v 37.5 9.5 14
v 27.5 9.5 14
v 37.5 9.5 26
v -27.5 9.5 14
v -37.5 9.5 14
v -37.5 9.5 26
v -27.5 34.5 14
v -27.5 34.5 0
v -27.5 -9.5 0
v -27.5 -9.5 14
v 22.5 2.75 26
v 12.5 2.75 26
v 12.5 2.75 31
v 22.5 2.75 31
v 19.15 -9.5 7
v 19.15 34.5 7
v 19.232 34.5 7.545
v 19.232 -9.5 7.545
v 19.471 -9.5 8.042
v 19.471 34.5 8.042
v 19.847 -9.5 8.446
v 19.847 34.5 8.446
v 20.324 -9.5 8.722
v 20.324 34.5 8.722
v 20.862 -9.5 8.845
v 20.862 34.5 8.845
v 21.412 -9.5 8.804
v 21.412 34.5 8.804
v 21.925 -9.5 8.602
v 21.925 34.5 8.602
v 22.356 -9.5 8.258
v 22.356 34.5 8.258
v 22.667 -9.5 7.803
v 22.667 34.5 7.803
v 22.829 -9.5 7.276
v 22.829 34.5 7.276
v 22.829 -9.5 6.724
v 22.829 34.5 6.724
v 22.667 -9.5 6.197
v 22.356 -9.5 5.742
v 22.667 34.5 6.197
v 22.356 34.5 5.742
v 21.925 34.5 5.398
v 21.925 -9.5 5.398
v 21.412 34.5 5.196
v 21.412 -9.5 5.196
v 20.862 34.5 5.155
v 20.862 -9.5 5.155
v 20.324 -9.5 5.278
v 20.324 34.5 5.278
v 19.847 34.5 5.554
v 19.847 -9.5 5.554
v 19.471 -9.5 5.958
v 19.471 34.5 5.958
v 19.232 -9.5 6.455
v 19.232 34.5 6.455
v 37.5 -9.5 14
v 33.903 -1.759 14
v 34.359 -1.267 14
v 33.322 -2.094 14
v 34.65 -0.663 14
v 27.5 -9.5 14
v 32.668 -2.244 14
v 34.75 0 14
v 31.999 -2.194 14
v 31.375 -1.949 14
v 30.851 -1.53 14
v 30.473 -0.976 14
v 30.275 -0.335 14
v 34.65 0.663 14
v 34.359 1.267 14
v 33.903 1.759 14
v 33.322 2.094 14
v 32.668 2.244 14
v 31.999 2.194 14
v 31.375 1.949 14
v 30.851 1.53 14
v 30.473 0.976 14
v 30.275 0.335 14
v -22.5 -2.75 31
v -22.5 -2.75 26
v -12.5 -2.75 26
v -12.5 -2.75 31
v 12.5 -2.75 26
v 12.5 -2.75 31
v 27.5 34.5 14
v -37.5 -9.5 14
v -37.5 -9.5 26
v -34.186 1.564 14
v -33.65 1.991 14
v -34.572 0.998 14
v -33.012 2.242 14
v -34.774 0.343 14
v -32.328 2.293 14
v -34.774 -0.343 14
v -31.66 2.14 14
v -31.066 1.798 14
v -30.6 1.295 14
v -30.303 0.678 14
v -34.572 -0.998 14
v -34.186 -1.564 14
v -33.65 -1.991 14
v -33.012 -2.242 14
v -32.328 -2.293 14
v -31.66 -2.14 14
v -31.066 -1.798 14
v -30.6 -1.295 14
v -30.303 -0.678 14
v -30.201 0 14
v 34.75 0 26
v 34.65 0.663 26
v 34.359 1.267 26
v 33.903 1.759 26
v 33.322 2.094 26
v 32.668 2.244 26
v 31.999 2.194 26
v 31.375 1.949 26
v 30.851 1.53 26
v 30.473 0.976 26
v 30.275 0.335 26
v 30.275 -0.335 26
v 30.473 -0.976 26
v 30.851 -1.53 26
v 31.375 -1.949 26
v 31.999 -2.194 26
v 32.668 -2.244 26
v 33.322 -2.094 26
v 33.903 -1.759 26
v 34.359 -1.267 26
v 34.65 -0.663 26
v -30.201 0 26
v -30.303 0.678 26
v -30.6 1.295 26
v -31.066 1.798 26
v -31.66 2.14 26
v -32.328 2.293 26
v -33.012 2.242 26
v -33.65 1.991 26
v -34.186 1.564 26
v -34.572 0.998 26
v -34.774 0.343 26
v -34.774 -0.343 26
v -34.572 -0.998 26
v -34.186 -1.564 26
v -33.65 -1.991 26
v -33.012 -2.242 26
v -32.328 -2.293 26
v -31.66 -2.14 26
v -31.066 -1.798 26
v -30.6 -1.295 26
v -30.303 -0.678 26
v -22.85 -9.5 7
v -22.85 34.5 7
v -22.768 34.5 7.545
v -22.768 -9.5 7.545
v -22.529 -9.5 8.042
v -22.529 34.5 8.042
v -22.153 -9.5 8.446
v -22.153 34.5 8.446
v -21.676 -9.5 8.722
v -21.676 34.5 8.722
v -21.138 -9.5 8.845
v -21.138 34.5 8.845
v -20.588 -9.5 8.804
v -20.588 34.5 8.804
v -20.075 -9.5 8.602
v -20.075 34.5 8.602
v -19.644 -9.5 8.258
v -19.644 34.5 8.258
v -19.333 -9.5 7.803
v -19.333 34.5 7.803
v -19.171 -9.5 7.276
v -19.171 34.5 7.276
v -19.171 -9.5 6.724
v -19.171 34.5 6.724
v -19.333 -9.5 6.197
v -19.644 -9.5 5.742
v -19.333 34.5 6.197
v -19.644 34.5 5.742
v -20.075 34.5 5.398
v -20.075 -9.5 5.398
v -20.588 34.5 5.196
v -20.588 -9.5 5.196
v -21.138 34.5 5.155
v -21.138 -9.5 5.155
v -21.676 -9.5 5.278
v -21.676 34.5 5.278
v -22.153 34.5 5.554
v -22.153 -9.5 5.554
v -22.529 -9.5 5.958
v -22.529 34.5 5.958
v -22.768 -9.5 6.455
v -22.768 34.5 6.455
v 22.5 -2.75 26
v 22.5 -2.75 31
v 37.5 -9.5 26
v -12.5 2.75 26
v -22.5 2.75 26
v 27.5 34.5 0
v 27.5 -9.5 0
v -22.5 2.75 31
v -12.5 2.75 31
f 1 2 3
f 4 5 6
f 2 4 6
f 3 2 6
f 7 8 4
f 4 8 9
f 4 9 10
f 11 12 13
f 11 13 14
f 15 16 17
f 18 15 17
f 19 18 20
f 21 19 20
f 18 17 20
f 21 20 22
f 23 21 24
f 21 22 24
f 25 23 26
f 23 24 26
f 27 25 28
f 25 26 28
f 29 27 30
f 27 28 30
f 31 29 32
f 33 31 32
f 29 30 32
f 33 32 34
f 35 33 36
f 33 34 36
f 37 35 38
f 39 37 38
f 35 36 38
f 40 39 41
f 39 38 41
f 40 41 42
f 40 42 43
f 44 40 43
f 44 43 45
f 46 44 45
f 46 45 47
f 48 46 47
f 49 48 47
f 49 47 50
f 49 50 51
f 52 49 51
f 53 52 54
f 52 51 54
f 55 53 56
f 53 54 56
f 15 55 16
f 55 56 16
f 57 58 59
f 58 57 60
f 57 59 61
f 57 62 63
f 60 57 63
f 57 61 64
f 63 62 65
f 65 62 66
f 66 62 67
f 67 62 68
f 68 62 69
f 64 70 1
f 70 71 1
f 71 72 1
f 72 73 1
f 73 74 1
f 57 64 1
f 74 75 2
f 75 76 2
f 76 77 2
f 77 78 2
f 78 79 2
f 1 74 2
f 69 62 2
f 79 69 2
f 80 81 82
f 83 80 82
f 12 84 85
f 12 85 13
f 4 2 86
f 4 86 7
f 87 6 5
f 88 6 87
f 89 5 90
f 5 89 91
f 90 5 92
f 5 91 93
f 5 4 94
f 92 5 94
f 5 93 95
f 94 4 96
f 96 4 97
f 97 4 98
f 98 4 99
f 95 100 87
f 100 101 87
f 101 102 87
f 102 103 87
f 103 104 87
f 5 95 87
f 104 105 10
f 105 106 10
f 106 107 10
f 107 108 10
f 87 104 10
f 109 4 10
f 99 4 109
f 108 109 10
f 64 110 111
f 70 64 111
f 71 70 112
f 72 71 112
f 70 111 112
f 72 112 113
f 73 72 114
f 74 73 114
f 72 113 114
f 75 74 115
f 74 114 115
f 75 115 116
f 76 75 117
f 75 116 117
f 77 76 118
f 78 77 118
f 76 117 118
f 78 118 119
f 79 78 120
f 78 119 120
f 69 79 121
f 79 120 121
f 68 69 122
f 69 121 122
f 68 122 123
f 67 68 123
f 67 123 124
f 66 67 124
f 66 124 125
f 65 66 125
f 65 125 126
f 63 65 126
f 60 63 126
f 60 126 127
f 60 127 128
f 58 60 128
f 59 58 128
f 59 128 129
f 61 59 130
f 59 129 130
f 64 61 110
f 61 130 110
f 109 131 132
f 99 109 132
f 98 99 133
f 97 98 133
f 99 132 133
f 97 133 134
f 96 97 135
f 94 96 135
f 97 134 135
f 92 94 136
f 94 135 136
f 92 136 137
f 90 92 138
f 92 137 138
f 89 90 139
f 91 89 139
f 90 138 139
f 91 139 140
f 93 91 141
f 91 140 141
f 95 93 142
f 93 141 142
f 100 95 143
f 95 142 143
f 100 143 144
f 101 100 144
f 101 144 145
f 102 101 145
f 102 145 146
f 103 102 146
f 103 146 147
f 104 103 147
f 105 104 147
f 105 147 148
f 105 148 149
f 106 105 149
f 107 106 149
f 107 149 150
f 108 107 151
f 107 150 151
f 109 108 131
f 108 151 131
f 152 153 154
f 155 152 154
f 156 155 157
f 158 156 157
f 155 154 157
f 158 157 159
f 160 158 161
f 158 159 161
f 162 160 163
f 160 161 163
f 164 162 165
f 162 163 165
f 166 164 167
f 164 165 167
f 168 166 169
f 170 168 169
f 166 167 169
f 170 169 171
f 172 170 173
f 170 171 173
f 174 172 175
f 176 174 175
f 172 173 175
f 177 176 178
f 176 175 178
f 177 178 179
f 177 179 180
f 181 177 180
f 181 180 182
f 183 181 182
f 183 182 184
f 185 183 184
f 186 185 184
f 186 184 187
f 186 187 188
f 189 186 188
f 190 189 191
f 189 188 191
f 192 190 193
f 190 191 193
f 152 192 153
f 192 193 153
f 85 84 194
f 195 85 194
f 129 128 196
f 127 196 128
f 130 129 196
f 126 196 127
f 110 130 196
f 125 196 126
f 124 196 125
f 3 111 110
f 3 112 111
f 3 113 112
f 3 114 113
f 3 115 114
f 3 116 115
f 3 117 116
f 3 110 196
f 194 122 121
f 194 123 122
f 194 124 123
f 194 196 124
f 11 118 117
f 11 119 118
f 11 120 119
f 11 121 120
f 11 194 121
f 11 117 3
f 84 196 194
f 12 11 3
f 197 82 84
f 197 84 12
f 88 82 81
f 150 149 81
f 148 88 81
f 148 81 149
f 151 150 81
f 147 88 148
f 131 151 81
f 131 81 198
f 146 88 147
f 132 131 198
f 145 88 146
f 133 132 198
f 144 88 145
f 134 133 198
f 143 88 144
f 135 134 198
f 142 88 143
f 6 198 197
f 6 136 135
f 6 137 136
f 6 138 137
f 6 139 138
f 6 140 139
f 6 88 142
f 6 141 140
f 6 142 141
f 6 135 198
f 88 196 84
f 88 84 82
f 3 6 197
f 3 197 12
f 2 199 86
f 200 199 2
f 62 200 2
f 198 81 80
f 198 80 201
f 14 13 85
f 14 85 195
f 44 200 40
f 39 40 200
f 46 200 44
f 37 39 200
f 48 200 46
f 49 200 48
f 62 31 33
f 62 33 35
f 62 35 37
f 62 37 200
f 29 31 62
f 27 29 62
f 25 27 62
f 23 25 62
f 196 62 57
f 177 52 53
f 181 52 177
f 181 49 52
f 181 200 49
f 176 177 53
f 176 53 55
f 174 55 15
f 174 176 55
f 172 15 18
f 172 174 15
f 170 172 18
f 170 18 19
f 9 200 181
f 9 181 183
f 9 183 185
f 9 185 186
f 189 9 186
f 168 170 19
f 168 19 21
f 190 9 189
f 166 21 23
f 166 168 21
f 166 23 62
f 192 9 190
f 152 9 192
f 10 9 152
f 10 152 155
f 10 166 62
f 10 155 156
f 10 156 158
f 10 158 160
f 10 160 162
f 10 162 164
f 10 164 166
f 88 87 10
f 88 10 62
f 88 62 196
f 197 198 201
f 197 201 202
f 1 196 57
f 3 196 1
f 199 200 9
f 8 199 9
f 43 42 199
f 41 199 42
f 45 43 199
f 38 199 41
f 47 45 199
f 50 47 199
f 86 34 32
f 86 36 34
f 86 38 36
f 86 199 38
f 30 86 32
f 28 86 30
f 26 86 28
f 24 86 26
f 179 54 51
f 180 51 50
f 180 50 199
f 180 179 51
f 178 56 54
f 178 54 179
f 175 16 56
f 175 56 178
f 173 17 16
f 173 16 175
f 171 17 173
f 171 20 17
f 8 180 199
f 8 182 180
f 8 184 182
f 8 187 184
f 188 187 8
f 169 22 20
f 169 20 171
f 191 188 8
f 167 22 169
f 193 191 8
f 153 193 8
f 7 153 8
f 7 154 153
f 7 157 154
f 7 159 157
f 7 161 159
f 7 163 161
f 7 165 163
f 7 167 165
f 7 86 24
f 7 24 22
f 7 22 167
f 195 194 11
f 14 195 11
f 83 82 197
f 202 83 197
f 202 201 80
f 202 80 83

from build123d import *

# Parameters (mm, degrees)
F0_W      = 55
F0_H      = 19
F1_DEPTH  = 26
F2_W      = 55
F2_H      = 14
F3_DEPTH  = 25
F4_W      = 19
F4_H      = 12
F5_DEPTH  = 10
F6_W      = 19
F6_H      = 12
F7_DEPTH  = 10
F8_R      = 1.85
F9_DEPTH  = 44
F10_DEPTH = 44
F11_R     = 2.25
F11_R_2   = 2.2993583235
F12_DEPTH = 12
F13_W     = 10
F13_H     = 5.5
F14_DEPTH = 5


with BuildPart() as f1:
    # F0 (on Top) → F1 (new body)
    with BuildSketch(Plane.XY):
        Rectangle(F0_W, F0_H)
    extrude(amount=F1_DEPTH)

    # F2 (on face) → F3 (join)
    with BuildSketch(Plane(origin=(0, 9.5, 0), x_dir=(-1, 0, 0), z_dir=(0, 1, 0))):
        with Locations((0, 7)):
            Rectangle(F2_W, F2_H)
    extrude(amount=F3_DEPTH)

    # F4 (on face) + F3_face1 (on face) → F5 (join)
    with BuildSketch(Plane(origin=(-27.5, 0, 0), x_dir=(0, -1, 0), z_dir=(-1, 0, 0))):
        with Locations((0, 20)):
            Rectangle(F4_W, F4_H)
    with BuildSketch(Plane(origin=(27.5, 9.1232227488, 10.5118483412), x_dir=(0, 1, 0), z_dir=(1, 0, 0))):
        Polygon((-18.6232227488, 15.4881516588), (-18.6232227488, -10.5118483412), (25.3767772512, -10.5118483412), (25.3767772512, 3.4881516588), (0.3767772512, 3.4881516588), (0.3767772512, 15.4881516588), align=None)
    extrude(amount=F5_DEPTH, dir=(-1, 0, 0))

    # F6 (on face) → F7 (join)
    with BuildSketch(Plane.YZ.offset(27.5)):
        with Locations((0, 20)):
            Rectangle(F6_W, F6_H)
    extrude(amount=F7_DEPTH)

    # F8 (on face) → F9 (cut)
    with BuildSketch(Plane(origin=(0, 34.5, 0), x_dir=(-1, 0, 0), z_dir=(0, 1, 0))):
        with Locations((-21, 7)):
            Circle(F8_R)
        with Locations((21, 7)):
            Circle(F8_R)
    extrude(amount=-F9_DEPTH, mode=Mode.SUBTRACT)

    # F8 (on face) → F10 (cut)
    with BuildSketch(Plane(origin=(0, 34.5, 0), x_dir=(-1, 0, 0), z_dir=(0, 1, 0))):
        with Locations((-21, 7)):
            Circle(F8_R)
        with Locations((21, 7)):
            Circle(F8_R)
    extrude(amount=-F10_DEPTH, mode=Mode.SUBTRACT)

    # F11 (on face) → F12 (cut)
    with BuildSketch(Plane.XY.offset(26)):
        with Locations((32.5, 0)):
            Circle(F11_R)
        with Locations((-32.5, 0)):
            Circle(F11_R_2)
    extrude(amount=-F12_DEPTH, mode=Mode.SUBTRACT)

    # F13 (on face) → F14 (join)
    with BuildSketch(Plane.XY.offset(26)):
        with Locations((17.5, 0)):
            Rectangle(F13_W, F13_H)
        with Locations((-17.5, 0)):
            Rectangle(F13_W, F13_H)
    extrude(amount=F14_DEPTH)


solid = f1.part
